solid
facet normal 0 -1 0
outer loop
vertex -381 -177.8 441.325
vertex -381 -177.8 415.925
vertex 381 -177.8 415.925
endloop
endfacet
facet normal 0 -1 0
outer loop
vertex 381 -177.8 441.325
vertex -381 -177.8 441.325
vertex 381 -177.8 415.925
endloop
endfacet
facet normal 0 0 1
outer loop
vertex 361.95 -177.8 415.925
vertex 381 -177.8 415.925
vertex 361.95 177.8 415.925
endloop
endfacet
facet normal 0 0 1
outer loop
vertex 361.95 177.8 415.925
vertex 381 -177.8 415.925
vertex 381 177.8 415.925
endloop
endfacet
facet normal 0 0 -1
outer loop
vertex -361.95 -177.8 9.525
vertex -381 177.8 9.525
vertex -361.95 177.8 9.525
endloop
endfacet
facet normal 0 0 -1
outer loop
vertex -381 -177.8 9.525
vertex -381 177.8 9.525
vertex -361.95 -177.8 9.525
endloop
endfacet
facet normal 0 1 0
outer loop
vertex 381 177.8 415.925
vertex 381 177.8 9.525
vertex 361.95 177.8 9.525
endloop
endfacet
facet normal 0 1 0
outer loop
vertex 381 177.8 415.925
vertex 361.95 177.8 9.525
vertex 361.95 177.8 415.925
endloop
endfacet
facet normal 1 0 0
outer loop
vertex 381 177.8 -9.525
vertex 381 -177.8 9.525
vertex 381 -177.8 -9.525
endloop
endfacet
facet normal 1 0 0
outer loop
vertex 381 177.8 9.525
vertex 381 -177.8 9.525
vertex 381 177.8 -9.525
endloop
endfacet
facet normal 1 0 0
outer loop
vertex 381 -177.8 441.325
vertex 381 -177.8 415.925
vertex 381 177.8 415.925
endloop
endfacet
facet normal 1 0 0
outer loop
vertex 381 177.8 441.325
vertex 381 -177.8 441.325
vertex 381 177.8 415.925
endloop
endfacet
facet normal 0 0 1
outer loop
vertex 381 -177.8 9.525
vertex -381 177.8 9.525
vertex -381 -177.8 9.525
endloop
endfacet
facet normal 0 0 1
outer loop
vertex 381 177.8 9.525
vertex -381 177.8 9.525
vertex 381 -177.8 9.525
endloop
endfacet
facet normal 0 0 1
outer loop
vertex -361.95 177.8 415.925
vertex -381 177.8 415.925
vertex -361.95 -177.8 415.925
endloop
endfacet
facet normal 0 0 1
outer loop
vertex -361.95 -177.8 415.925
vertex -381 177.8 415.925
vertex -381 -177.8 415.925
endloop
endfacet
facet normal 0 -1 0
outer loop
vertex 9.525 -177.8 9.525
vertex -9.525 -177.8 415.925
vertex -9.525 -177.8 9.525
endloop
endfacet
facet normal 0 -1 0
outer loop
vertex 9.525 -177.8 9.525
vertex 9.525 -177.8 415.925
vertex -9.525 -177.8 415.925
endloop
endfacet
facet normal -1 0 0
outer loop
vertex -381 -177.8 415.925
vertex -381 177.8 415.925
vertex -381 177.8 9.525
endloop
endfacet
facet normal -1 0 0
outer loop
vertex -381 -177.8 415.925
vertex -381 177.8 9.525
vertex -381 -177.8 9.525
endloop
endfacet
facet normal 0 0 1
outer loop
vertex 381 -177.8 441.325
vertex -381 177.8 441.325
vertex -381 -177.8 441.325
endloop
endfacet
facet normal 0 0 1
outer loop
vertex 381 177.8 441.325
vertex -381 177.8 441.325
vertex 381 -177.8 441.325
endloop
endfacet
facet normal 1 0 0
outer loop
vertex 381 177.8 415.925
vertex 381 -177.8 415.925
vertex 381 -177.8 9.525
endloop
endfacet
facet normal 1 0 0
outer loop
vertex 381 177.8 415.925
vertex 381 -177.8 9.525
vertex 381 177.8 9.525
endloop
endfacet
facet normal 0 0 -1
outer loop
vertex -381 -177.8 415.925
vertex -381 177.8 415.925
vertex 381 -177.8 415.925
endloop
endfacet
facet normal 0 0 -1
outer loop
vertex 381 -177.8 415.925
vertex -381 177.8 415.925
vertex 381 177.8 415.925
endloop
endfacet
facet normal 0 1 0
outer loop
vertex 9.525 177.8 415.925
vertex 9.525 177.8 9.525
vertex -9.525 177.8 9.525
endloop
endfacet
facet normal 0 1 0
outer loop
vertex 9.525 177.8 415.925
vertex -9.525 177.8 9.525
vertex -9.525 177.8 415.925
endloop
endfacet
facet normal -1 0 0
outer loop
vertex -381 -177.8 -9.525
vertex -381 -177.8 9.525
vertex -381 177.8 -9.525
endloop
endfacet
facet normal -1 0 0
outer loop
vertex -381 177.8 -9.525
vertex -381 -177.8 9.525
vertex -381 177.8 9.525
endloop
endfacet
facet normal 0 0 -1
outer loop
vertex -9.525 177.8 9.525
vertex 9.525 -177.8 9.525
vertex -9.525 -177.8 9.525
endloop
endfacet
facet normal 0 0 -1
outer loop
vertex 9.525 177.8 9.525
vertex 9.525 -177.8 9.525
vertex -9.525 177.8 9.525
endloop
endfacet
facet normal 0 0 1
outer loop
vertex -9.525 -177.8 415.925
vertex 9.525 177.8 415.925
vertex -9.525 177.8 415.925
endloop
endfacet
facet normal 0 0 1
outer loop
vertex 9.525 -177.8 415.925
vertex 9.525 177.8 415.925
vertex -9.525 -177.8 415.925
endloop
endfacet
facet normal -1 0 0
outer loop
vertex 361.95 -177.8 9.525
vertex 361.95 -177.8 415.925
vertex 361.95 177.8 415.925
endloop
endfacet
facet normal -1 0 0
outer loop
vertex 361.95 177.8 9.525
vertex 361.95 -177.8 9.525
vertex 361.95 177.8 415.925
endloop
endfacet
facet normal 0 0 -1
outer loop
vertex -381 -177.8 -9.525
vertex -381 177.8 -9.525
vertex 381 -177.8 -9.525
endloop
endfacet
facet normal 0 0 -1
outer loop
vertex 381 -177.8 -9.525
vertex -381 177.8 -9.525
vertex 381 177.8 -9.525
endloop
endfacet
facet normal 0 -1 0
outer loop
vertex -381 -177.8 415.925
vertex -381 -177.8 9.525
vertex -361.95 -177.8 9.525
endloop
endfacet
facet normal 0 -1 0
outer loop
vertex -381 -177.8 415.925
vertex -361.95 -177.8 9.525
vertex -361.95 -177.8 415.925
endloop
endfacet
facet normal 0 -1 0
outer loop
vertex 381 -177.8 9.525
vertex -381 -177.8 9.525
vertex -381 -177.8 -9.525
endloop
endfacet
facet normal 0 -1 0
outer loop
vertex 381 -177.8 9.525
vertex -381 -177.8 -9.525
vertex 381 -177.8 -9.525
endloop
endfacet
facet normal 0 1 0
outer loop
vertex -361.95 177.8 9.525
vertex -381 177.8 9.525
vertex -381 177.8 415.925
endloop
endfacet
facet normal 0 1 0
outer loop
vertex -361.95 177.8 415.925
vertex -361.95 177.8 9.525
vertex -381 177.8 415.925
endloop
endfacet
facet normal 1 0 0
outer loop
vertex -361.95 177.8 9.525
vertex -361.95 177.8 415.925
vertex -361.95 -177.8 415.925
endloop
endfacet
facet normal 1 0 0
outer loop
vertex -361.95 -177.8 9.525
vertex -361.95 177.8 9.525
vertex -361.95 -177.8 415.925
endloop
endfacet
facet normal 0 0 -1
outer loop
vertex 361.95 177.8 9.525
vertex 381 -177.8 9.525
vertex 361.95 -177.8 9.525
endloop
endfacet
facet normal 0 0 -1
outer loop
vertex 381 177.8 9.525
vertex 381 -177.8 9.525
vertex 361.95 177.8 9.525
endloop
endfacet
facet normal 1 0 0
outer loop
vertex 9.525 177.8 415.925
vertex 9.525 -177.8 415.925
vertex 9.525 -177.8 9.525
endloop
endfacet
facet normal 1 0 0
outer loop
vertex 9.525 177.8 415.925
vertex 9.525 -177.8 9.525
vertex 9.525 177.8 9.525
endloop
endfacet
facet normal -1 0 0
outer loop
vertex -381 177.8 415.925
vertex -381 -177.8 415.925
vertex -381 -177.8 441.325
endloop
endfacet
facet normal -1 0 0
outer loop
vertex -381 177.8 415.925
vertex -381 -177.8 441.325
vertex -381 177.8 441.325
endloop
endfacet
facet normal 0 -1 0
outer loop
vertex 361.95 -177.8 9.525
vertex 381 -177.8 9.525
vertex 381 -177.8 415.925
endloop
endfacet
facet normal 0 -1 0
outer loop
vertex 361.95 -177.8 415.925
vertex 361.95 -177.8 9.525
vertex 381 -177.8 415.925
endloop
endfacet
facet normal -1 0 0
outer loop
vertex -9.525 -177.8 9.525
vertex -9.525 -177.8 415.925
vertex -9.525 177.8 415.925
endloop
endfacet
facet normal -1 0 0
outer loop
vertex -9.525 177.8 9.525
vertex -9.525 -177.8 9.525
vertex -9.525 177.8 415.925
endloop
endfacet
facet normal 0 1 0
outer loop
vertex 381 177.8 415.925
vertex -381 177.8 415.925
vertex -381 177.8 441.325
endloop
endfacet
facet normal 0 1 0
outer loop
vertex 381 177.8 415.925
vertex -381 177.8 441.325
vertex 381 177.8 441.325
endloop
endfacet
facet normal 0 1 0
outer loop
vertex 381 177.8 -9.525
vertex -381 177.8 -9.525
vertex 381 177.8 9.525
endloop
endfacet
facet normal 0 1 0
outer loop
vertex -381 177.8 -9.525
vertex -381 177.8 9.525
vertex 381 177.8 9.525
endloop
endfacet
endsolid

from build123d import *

# Parameters (mm, degrees)
F0_W     = 762
F0_H     = 355.6
F1_DEPTH = 9.525
F2_W     = 355.6
F2_H     = 406.4
F3_DEPTH = 19.05
F5_DEPTH = 9.525
F6_W     = 355.6
F6_H     = 406.4
F7_DEPTH = 19.05
F8_W     = 762
F8_H     = 355.6
F9_DEPTH = 25.4


with BuildPart() as f1:
    # F0 (on Top) → F1 (new body, symmetric)
    with BuildSketch(Plane.XY):
        Rectangle(F0_W, F0_H)
    extrude(amount=F1_DEPTH, both=True)


with BuildPart() as f3:
    # F2 (on face) → F3 (new body)
    with BuildSketch(Plane.YZ.offset(381)):
        with Locations((0, 212.725)):
            Rectangle(F2_W, F2_H)
    extrude(amount=-F3_DEPTH)


with BuildPart() as f5:
    # F4 (on Right) → F5 (new body, symmetric)
    with BuildSketch(Plane.YZ):
        Polygon((-177.8, 415.925), (-177.8, 9.525), (177.8, 9.525), (177.8, 415.925), (88.9, 415.925), align=None)
    extrude(amount=F5_DEPTH, both=True)


with BuildPart() as f7:
    # F6 (on face) → F7 (new body)
    with BuildSketch(Plane(origin=(-381, 0, 0), x_dir=(0, -1, 0), z_dir=(-1, 0, 0))):
        with Locations((0, 212.725)):
            Rectangle(F6_W, F6_H)
    extrude(amount=-F7_DEPTH)


with BuildPart() as f9:
    # F8 (on face) → F9 (new body)
    with BuildSketch(Plane.XY.offset(415.925)):
        Rectangle(F8_W, F8_H)
    extrude(amount=F9_DEPTH)


solid = Compound([f1.part, f3.part, f5.part, f7.part, f9.part])
